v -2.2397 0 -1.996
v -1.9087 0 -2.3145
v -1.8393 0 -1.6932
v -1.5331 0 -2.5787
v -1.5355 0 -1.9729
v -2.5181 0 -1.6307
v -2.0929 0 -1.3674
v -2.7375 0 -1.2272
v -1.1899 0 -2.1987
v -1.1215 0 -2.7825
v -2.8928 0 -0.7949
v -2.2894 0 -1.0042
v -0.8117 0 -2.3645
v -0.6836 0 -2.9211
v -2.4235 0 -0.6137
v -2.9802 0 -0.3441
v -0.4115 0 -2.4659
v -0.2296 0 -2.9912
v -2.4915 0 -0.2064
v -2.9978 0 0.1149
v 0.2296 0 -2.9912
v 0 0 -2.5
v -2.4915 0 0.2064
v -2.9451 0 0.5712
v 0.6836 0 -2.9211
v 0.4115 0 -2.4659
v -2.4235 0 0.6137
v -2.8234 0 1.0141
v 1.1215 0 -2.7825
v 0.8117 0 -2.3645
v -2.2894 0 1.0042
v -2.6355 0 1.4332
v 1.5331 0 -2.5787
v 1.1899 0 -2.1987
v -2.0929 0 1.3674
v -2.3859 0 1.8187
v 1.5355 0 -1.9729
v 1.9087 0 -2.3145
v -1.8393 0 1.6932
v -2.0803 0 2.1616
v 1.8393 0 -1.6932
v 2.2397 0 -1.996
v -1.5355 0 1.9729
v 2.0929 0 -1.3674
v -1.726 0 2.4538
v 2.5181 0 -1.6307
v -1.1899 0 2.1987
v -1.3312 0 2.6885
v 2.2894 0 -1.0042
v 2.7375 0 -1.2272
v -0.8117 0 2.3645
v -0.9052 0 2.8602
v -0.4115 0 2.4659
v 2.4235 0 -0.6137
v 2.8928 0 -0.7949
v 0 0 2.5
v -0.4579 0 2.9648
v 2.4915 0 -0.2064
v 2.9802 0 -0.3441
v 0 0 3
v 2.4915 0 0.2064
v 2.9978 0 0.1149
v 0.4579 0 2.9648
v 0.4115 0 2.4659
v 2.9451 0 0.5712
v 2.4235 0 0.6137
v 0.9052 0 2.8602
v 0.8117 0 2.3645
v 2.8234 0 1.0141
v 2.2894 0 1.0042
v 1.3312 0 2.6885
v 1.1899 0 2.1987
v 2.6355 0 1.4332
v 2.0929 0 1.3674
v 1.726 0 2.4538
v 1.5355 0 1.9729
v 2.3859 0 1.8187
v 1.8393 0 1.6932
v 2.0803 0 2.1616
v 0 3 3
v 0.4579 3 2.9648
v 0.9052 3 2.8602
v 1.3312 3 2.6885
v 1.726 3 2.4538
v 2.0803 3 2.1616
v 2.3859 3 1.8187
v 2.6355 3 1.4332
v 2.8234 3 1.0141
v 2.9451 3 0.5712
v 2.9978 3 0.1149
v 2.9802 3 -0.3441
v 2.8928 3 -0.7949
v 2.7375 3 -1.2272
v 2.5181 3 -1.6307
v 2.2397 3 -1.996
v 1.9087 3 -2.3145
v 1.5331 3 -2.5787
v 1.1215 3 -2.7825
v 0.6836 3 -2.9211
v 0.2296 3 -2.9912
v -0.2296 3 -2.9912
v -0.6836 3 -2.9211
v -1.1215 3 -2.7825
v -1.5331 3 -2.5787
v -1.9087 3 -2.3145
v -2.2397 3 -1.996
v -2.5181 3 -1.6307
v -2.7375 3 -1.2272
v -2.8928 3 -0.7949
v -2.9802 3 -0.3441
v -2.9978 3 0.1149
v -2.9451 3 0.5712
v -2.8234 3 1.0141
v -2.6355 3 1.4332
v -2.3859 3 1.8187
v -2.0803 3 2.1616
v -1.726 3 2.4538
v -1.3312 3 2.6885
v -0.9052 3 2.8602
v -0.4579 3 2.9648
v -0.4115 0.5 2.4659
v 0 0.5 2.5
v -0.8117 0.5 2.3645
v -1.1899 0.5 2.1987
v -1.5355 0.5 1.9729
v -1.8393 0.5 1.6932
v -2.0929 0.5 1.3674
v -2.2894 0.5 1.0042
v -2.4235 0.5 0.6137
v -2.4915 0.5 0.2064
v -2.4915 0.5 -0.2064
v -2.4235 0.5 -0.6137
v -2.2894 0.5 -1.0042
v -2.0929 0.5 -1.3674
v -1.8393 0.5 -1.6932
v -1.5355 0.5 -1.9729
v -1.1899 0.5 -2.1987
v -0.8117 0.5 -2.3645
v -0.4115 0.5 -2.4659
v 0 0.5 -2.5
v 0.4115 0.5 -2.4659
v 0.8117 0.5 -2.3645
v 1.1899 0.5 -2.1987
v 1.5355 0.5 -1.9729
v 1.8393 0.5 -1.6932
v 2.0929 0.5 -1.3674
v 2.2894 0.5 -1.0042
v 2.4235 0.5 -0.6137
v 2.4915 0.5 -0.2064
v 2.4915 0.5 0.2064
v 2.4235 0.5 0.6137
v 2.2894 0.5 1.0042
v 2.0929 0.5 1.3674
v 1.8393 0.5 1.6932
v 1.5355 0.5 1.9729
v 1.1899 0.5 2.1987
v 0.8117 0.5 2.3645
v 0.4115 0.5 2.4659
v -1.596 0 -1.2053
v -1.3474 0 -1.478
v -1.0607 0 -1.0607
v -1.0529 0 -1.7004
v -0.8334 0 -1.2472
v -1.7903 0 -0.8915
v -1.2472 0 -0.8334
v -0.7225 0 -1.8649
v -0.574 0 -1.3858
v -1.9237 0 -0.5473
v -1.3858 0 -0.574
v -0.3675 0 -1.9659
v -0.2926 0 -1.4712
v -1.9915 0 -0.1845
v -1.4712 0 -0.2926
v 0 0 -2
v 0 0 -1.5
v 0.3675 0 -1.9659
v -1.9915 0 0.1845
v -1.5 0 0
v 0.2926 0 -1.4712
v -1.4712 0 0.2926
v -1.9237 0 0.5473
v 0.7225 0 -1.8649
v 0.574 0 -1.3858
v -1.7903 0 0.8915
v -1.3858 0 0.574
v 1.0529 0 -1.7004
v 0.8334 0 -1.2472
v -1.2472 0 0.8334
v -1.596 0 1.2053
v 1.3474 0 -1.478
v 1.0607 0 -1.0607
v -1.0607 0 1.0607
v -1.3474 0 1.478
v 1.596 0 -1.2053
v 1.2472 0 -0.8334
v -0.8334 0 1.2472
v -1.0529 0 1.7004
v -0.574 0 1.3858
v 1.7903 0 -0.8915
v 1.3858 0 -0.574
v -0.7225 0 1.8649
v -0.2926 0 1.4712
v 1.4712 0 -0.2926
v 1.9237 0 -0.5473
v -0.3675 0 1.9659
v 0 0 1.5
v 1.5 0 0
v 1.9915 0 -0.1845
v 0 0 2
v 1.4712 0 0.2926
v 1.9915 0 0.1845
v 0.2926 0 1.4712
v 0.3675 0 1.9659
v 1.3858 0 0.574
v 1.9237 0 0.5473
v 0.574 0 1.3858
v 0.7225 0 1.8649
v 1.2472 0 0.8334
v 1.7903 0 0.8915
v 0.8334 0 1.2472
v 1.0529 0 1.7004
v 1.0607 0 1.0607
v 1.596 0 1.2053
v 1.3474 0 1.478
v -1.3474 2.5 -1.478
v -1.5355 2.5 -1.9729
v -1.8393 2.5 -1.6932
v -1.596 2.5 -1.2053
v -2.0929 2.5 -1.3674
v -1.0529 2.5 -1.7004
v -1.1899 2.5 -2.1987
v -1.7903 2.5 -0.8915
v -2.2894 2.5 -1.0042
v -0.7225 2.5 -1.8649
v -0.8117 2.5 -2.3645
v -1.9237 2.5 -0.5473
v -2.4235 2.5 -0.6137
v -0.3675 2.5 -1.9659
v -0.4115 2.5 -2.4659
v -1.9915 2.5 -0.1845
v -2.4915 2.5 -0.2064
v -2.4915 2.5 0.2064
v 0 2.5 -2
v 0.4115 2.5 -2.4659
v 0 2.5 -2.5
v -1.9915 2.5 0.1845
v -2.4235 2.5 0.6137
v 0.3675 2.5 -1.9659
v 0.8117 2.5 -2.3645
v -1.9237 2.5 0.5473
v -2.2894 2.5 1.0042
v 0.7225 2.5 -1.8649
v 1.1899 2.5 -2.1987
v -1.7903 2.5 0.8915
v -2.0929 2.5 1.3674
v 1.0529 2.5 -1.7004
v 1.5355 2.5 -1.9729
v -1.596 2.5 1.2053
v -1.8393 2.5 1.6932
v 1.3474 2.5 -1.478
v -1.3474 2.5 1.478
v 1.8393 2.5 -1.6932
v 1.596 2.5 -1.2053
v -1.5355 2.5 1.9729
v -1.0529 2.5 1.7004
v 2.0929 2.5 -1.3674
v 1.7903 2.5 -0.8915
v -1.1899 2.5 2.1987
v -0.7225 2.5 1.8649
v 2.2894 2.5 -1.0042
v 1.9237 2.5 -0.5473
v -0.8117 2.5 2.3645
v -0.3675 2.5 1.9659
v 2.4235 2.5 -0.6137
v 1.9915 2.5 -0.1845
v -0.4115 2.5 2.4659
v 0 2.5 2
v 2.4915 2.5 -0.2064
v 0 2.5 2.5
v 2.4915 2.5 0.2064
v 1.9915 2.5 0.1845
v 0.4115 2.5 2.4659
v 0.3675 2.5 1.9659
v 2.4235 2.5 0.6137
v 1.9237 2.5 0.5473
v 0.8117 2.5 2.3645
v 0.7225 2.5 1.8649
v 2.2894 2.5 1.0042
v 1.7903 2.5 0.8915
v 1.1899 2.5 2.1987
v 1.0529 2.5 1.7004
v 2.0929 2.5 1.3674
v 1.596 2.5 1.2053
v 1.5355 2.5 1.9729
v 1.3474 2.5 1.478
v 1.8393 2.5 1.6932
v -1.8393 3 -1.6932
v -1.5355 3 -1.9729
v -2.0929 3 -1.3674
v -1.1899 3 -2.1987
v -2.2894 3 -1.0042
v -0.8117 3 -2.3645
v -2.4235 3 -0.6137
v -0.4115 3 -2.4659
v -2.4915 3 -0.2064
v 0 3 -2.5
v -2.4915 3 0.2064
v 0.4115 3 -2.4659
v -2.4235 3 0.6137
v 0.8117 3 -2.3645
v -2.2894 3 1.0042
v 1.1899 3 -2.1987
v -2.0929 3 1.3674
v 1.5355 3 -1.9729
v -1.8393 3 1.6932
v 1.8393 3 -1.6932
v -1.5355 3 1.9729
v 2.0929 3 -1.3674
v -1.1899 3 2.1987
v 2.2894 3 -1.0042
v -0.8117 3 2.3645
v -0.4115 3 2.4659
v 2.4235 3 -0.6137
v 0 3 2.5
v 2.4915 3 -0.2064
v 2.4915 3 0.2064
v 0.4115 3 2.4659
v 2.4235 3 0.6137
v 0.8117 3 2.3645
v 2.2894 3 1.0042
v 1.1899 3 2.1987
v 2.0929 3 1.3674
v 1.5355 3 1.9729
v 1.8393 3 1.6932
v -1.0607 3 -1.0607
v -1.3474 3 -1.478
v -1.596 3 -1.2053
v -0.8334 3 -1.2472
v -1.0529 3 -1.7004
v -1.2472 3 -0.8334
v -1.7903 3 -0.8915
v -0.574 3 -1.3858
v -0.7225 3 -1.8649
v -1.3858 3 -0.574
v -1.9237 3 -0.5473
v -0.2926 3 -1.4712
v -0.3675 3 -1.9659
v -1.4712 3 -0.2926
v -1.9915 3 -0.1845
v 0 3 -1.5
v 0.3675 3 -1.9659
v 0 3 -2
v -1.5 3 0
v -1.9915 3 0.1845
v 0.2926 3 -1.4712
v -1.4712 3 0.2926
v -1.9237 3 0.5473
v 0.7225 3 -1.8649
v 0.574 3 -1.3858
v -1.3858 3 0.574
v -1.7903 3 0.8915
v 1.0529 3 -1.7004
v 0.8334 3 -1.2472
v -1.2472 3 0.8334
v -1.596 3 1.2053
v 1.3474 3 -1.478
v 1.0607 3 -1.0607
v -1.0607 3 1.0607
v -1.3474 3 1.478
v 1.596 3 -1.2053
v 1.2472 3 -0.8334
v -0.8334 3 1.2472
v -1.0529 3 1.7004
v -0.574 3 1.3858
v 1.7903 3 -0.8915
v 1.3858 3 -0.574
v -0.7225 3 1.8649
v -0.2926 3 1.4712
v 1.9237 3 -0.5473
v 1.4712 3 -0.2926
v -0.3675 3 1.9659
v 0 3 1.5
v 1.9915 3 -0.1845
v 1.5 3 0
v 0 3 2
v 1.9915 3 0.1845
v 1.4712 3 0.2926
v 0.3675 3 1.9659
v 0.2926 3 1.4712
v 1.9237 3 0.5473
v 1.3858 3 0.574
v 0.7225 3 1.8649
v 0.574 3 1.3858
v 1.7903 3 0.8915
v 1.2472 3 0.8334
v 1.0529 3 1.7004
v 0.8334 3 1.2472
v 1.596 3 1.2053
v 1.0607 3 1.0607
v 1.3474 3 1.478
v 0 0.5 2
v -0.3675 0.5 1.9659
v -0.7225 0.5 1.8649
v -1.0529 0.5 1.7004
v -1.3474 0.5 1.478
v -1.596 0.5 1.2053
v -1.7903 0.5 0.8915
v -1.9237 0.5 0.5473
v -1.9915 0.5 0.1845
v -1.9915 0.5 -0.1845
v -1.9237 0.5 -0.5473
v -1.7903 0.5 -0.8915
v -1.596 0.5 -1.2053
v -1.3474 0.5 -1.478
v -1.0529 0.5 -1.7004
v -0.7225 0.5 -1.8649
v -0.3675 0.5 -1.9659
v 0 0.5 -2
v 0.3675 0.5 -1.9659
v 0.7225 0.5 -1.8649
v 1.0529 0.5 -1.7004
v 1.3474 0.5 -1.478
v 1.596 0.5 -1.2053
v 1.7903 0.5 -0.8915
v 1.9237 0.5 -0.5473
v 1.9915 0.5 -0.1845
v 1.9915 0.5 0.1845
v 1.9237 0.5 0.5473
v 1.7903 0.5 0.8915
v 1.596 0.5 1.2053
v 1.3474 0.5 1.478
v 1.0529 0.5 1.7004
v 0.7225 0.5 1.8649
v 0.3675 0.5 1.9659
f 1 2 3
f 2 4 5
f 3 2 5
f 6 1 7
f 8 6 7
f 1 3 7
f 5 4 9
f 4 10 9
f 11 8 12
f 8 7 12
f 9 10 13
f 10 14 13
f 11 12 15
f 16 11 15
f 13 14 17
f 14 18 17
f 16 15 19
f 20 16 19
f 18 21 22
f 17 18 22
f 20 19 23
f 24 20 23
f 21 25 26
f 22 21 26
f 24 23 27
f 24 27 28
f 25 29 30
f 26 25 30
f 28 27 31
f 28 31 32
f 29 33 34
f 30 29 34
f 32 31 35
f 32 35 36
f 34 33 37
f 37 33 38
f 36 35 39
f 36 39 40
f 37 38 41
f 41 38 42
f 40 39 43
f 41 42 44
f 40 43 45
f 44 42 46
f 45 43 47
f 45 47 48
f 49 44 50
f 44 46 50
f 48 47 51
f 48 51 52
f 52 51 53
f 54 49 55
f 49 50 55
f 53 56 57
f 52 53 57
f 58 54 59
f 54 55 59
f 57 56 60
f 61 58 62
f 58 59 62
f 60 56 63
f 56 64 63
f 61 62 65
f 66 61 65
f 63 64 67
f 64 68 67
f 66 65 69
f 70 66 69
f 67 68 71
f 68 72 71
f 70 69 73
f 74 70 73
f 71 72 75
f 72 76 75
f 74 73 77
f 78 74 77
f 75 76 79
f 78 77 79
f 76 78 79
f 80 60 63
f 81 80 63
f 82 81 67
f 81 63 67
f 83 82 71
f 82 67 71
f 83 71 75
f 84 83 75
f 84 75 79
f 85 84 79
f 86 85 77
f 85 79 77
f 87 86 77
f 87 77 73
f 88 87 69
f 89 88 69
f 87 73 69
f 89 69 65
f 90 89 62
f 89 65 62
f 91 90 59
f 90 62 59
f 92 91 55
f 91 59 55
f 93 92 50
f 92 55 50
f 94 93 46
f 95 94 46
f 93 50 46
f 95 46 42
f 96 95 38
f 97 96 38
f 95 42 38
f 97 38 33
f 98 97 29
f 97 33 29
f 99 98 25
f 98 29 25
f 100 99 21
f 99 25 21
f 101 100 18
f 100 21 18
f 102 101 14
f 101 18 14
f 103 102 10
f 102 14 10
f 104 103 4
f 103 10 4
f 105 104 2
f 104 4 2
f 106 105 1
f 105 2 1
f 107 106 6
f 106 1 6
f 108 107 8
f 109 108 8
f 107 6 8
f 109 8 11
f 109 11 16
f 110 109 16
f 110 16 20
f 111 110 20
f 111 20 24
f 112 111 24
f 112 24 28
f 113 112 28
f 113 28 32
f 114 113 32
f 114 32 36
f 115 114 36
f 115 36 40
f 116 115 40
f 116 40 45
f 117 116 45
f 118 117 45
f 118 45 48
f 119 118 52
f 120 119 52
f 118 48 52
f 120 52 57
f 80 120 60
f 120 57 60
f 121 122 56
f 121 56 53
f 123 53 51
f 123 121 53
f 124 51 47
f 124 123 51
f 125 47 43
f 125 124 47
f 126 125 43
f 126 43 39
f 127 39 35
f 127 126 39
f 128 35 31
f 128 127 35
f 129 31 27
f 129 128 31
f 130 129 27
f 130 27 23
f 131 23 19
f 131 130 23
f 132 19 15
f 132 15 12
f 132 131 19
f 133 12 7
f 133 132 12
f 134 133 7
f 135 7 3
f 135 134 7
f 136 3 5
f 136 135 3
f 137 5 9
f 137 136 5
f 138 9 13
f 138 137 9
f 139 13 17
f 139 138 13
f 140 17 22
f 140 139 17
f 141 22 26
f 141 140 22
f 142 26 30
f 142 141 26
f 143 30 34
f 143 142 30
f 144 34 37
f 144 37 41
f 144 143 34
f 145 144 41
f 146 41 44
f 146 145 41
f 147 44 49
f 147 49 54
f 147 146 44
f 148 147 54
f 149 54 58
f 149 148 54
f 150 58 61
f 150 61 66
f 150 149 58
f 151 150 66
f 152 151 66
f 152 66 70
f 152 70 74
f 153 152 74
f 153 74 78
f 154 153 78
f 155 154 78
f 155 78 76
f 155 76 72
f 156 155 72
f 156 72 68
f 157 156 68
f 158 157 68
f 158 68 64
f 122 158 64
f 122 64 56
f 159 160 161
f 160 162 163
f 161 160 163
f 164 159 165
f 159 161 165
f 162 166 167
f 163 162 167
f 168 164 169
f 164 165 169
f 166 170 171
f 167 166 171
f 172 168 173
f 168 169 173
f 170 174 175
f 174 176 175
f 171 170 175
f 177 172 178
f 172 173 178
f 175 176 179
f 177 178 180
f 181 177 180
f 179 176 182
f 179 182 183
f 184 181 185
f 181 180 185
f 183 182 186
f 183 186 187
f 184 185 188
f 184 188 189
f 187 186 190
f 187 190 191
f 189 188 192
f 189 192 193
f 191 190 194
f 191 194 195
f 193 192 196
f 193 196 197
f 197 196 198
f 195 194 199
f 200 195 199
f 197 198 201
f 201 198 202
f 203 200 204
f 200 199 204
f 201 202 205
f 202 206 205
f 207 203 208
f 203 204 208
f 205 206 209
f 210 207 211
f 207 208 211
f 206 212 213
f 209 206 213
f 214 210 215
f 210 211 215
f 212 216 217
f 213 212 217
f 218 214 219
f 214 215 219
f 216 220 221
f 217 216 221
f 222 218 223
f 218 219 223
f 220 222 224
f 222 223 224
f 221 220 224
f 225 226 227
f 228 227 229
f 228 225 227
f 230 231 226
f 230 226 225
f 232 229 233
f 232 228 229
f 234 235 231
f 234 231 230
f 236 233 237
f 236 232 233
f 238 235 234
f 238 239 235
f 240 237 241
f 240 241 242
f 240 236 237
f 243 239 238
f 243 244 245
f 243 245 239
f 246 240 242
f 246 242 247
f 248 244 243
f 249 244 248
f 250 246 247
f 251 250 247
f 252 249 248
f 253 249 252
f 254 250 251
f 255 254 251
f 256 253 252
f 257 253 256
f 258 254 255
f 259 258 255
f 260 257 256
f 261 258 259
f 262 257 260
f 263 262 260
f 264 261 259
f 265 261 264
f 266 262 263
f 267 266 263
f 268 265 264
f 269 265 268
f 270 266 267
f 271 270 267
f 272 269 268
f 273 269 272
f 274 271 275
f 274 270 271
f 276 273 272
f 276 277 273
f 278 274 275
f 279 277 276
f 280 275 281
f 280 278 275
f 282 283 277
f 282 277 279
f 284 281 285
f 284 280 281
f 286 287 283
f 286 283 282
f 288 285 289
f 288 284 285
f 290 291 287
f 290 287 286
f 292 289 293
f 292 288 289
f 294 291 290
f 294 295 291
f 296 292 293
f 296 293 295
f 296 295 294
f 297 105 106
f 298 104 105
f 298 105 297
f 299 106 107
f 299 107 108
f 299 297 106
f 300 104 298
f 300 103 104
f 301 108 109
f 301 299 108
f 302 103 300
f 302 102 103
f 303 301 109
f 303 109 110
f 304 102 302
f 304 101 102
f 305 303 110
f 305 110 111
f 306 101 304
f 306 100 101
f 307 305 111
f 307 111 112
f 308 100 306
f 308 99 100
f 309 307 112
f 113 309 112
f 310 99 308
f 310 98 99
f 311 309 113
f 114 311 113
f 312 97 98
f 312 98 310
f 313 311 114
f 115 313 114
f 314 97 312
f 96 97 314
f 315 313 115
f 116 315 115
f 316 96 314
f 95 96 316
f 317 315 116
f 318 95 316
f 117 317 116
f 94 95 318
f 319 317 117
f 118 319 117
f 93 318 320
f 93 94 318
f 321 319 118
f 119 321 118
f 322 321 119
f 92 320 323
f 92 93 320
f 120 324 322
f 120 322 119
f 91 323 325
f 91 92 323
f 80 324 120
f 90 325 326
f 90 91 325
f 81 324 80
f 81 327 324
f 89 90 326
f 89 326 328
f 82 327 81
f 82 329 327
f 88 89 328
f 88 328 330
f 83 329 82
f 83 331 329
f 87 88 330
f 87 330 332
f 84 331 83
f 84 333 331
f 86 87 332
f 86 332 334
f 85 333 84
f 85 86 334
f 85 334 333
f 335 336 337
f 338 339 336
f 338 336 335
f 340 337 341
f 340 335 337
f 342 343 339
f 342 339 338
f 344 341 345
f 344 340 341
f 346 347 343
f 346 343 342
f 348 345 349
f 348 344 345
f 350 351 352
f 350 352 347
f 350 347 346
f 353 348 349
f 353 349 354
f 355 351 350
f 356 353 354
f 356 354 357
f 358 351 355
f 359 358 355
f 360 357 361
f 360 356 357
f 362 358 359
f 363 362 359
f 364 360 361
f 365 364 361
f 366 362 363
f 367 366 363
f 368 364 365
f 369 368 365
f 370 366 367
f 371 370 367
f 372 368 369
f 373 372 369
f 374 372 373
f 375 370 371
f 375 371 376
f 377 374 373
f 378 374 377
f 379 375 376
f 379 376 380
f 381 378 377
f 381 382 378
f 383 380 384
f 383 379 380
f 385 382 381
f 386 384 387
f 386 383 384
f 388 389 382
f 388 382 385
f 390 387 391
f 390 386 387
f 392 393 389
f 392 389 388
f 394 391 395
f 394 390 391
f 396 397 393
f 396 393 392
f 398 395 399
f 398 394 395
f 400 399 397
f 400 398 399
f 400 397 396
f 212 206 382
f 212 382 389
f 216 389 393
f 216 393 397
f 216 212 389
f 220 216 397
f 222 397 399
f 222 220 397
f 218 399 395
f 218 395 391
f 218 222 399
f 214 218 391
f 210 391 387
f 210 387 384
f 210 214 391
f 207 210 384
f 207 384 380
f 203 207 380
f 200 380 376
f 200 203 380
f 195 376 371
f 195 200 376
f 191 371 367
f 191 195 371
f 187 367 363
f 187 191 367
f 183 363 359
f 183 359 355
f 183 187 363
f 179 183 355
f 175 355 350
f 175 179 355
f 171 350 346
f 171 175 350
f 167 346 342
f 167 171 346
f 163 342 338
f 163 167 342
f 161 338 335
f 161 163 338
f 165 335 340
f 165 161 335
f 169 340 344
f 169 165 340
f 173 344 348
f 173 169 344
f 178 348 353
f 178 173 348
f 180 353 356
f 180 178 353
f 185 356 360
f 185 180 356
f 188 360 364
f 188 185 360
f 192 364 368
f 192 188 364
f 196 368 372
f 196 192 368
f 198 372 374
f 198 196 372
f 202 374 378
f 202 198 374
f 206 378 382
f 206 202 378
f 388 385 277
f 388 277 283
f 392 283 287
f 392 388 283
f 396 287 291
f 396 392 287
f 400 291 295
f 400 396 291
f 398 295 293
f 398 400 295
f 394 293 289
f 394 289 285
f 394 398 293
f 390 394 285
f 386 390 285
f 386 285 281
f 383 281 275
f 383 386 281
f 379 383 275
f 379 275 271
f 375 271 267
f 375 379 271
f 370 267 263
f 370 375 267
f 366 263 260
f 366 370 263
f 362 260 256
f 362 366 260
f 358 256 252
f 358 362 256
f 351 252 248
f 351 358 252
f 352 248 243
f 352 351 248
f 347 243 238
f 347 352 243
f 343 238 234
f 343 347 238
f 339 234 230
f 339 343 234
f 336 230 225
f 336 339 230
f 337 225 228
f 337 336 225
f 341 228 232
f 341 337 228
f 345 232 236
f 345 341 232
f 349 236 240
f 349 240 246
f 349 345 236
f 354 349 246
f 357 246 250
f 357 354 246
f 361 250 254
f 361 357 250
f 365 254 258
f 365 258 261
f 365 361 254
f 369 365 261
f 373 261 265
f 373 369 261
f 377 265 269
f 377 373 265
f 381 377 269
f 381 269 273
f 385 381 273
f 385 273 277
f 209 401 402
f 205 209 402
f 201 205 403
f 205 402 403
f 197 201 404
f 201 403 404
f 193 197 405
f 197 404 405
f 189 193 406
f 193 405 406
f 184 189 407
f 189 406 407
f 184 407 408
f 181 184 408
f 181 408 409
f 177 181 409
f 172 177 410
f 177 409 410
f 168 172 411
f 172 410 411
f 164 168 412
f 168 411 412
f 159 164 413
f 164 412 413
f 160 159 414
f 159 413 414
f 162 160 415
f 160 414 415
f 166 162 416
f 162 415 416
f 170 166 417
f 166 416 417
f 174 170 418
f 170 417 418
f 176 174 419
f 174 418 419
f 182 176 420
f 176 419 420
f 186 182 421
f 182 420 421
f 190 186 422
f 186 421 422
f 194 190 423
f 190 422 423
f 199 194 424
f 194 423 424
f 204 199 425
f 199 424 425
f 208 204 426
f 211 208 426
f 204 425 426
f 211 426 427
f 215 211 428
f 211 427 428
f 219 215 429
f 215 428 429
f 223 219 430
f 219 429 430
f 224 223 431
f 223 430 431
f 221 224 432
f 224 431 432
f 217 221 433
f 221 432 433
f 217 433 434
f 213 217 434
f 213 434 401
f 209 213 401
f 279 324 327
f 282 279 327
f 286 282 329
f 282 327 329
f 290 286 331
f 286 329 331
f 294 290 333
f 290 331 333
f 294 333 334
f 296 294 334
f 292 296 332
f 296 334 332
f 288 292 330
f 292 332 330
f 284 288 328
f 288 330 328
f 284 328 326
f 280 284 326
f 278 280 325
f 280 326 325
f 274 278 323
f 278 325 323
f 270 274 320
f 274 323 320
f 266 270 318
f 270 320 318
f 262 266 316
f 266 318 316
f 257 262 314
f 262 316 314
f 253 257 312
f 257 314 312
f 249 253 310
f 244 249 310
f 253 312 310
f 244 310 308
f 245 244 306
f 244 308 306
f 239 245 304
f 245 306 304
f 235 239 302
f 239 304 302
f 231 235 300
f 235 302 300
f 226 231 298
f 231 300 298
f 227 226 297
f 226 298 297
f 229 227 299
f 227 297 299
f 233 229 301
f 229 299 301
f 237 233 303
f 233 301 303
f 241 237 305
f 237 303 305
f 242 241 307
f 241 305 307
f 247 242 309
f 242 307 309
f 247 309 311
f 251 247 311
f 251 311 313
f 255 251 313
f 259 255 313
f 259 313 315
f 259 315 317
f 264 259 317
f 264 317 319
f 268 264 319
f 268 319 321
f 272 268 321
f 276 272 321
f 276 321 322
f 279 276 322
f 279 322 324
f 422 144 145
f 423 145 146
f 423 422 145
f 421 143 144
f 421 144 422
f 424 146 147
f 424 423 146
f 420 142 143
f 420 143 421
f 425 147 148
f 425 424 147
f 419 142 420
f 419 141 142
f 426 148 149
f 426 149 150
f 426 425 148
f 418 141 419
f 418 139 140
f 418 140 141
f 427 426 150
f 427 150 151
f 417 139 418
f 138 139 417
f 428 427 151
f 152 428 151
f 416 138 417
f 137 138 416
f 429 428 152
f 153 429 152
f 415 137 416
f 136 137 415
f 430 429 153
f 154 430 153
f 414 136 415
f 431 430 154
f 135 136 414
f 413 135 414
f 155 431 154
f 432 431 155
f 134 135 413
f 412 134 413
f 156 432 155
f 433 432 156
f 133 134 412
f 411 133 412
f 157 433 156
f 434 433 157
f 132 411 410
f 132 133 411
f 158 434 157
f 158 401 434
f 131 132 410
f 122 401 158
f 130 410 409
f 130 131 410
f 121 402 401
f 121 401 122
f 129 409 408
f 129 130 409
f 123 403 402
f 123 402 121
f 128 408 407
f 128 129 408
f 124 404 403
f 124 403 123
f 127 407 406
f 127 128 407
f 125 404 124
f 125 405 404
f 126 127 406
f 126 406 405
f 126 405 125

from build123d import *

# Parameters (mm, degrees)
SKETCH1_R           = 3
SKETCH1_R_2         = 1.5
BOSS_EXTRUDE1_DEPTH = 3
SKETCH2_R           = 2.5
SKETCH2_R_2         = 2
CUT_EXTRUDE1_DEPTH  = 0.5
CUT_EXTRUDE2_START  = -0.5
SKETCH3_R           = 2.5
SKETCH3_R_2         = 2
CUT_EXTRUDE2_DEPTH  = 0.5


with BuildPart() as part:
    # Sketch1 → Boss-Extrude1 (new body)
    with BuildSketch(Plane(origin=(0, 0, 0), x_dir=(1, 0, 0), z_dir=(0, 1, 0))):
        with Locations(Location((0, 0, 0), (0, 0, 270))):
            Circle(SKETCH1_R)
        with Locations(Location((0, 0, 0), (0, 0, 270))):
            Circle(SKETCH1_R_2, mode=Mode.SUBTRACT)
    extrude(amount=BOSS_EXTRUDE1_DEPTH)

    # Sketch2 → Cut-Extrude1 (cut)
    with BuildSketch(Plane(origin=(0, 3, 0), x_dir=(1, 0, 0), z_dir=(0, 1, 0))):
        with Locations(Location((0, 0, 0), (0, 0, 270))):
            Circle(SKETCH2_R)
        with Locations(Location((0, 0, 0), (0, 0, 270))):
            Circle(SKETCH2_R_2, mode=Mode.SUBTRACT)
    extrude(amount=-CUT_EXTRUDE1_DEPTH, mode=Mode.SUBTRACT)

    # Sketch3 → Cut-Extrude2 (cut)
    with BuildSketch(Plane(origin=(0, 0, 0), x_dir=(-1, 0, 0), z_dir=(0, -1, 0)).offset(CUT_EXTRUDE2_START)):
        with Locations(Location((0, 0, 0), (0, 0, 270))):
            Circle(SKETCH3_R)
        with Locations(Location((0, 0, 0), (0, 0, 270))):
            Circle(SKETCH3_R_2, mode=Mode.SUBTRACT)
    extrude(amount=CUT_EXTRUDE2_DEPTH, mode=Mode.SUBTRACT)


solid = part.part
